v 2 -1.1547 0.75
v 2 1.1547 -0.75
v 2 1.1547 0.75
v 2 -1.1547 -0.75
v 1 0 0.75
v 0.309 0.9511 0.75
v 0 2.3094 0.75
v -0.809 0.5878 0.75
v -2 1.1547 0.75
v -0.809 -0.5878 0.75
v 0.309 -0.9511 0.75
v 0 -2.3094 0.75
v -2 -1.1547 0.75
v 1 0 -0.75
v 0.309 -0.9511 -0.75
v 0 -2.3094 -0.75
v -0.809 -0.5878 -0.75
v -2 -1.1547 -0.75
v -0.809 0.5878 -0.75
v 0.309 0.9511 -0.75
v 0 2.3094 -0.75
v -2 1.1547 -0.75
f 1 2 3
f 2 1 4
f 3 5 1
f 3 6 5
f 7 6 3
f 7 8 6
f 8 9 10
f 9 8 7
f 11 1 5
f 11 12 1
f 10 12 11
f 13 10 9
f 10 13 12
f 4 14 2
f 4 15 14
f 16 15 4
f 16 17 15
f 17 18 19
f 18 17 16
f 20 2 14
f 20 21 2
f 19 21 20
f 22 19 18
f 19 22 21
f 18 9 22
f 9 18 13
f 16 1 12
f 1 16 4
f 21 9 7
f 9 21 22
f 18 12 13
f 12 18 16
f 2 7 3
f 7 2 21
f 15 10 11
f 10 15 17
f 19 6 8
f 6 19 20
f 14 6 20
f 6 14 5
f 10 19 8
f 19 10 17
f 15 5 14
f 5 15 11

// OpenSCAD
module make_hex_nut(w, h, d=0){
    // d = inner diameter
    // w = width across the flats
    // h = height or thickness
    s = w/sqrt(3);
    difference(){
        union(){
            for(i=[0:1:2]){
                rotate([0,0,120*i])
                cube([w, s, h], center=true);
            }
        }
        if(d){
            cylinder(d=d, h=h+1, center=true);
        }
    }
}

//make_hex_nut(w=5, h=2, d=2.5);

module make_nut_2(d=2){
    make_hex_nut(w=4.8, h=2, d=d);
}

module make_nut_w4_h1p5(d=2){
    make_hex_nut(w=4, h=1.5, d=d);
}

module make_nut_2_5(d=2, h=3.5){
    make_hex_nut(w=5+0.5/2, h=h, d=d);
}

module make_nut_2_5_test(){
    difference(){
        translate([0,0,-.5])
        cube([10,10,2], center=true);
        make_nut_2_5(d=0);
    }
}

module make_nut_2_5_test_downward(){
    difference(){
        translate([0,0,1])
        cube([10,10,2*2.5], center=true);
        color("red")
        make_nut_2_5(d=0);
        color("blue")
        cylinder(d=2.5, h=10, center=true);
    }
}

module make_nut_2_5_test_punchout(){
    difference(){
        translate([0,0,1.5])
        cube([10,10,2*1.5], center=true);
        color("red")
        make_nut_2_5(d=0);
        color("blue")
        cylinder(d=2.5, h=10, center=true);
    }
    color("green")
    translate([0,0,1.8])
    cube([10,10,0.25], center=true);
}

//make_nut_2_5_test();
make_nut_w4_h1p5();
//make_nut_2_5_test_downward();
//make_nut_2_5_test_punchout();
